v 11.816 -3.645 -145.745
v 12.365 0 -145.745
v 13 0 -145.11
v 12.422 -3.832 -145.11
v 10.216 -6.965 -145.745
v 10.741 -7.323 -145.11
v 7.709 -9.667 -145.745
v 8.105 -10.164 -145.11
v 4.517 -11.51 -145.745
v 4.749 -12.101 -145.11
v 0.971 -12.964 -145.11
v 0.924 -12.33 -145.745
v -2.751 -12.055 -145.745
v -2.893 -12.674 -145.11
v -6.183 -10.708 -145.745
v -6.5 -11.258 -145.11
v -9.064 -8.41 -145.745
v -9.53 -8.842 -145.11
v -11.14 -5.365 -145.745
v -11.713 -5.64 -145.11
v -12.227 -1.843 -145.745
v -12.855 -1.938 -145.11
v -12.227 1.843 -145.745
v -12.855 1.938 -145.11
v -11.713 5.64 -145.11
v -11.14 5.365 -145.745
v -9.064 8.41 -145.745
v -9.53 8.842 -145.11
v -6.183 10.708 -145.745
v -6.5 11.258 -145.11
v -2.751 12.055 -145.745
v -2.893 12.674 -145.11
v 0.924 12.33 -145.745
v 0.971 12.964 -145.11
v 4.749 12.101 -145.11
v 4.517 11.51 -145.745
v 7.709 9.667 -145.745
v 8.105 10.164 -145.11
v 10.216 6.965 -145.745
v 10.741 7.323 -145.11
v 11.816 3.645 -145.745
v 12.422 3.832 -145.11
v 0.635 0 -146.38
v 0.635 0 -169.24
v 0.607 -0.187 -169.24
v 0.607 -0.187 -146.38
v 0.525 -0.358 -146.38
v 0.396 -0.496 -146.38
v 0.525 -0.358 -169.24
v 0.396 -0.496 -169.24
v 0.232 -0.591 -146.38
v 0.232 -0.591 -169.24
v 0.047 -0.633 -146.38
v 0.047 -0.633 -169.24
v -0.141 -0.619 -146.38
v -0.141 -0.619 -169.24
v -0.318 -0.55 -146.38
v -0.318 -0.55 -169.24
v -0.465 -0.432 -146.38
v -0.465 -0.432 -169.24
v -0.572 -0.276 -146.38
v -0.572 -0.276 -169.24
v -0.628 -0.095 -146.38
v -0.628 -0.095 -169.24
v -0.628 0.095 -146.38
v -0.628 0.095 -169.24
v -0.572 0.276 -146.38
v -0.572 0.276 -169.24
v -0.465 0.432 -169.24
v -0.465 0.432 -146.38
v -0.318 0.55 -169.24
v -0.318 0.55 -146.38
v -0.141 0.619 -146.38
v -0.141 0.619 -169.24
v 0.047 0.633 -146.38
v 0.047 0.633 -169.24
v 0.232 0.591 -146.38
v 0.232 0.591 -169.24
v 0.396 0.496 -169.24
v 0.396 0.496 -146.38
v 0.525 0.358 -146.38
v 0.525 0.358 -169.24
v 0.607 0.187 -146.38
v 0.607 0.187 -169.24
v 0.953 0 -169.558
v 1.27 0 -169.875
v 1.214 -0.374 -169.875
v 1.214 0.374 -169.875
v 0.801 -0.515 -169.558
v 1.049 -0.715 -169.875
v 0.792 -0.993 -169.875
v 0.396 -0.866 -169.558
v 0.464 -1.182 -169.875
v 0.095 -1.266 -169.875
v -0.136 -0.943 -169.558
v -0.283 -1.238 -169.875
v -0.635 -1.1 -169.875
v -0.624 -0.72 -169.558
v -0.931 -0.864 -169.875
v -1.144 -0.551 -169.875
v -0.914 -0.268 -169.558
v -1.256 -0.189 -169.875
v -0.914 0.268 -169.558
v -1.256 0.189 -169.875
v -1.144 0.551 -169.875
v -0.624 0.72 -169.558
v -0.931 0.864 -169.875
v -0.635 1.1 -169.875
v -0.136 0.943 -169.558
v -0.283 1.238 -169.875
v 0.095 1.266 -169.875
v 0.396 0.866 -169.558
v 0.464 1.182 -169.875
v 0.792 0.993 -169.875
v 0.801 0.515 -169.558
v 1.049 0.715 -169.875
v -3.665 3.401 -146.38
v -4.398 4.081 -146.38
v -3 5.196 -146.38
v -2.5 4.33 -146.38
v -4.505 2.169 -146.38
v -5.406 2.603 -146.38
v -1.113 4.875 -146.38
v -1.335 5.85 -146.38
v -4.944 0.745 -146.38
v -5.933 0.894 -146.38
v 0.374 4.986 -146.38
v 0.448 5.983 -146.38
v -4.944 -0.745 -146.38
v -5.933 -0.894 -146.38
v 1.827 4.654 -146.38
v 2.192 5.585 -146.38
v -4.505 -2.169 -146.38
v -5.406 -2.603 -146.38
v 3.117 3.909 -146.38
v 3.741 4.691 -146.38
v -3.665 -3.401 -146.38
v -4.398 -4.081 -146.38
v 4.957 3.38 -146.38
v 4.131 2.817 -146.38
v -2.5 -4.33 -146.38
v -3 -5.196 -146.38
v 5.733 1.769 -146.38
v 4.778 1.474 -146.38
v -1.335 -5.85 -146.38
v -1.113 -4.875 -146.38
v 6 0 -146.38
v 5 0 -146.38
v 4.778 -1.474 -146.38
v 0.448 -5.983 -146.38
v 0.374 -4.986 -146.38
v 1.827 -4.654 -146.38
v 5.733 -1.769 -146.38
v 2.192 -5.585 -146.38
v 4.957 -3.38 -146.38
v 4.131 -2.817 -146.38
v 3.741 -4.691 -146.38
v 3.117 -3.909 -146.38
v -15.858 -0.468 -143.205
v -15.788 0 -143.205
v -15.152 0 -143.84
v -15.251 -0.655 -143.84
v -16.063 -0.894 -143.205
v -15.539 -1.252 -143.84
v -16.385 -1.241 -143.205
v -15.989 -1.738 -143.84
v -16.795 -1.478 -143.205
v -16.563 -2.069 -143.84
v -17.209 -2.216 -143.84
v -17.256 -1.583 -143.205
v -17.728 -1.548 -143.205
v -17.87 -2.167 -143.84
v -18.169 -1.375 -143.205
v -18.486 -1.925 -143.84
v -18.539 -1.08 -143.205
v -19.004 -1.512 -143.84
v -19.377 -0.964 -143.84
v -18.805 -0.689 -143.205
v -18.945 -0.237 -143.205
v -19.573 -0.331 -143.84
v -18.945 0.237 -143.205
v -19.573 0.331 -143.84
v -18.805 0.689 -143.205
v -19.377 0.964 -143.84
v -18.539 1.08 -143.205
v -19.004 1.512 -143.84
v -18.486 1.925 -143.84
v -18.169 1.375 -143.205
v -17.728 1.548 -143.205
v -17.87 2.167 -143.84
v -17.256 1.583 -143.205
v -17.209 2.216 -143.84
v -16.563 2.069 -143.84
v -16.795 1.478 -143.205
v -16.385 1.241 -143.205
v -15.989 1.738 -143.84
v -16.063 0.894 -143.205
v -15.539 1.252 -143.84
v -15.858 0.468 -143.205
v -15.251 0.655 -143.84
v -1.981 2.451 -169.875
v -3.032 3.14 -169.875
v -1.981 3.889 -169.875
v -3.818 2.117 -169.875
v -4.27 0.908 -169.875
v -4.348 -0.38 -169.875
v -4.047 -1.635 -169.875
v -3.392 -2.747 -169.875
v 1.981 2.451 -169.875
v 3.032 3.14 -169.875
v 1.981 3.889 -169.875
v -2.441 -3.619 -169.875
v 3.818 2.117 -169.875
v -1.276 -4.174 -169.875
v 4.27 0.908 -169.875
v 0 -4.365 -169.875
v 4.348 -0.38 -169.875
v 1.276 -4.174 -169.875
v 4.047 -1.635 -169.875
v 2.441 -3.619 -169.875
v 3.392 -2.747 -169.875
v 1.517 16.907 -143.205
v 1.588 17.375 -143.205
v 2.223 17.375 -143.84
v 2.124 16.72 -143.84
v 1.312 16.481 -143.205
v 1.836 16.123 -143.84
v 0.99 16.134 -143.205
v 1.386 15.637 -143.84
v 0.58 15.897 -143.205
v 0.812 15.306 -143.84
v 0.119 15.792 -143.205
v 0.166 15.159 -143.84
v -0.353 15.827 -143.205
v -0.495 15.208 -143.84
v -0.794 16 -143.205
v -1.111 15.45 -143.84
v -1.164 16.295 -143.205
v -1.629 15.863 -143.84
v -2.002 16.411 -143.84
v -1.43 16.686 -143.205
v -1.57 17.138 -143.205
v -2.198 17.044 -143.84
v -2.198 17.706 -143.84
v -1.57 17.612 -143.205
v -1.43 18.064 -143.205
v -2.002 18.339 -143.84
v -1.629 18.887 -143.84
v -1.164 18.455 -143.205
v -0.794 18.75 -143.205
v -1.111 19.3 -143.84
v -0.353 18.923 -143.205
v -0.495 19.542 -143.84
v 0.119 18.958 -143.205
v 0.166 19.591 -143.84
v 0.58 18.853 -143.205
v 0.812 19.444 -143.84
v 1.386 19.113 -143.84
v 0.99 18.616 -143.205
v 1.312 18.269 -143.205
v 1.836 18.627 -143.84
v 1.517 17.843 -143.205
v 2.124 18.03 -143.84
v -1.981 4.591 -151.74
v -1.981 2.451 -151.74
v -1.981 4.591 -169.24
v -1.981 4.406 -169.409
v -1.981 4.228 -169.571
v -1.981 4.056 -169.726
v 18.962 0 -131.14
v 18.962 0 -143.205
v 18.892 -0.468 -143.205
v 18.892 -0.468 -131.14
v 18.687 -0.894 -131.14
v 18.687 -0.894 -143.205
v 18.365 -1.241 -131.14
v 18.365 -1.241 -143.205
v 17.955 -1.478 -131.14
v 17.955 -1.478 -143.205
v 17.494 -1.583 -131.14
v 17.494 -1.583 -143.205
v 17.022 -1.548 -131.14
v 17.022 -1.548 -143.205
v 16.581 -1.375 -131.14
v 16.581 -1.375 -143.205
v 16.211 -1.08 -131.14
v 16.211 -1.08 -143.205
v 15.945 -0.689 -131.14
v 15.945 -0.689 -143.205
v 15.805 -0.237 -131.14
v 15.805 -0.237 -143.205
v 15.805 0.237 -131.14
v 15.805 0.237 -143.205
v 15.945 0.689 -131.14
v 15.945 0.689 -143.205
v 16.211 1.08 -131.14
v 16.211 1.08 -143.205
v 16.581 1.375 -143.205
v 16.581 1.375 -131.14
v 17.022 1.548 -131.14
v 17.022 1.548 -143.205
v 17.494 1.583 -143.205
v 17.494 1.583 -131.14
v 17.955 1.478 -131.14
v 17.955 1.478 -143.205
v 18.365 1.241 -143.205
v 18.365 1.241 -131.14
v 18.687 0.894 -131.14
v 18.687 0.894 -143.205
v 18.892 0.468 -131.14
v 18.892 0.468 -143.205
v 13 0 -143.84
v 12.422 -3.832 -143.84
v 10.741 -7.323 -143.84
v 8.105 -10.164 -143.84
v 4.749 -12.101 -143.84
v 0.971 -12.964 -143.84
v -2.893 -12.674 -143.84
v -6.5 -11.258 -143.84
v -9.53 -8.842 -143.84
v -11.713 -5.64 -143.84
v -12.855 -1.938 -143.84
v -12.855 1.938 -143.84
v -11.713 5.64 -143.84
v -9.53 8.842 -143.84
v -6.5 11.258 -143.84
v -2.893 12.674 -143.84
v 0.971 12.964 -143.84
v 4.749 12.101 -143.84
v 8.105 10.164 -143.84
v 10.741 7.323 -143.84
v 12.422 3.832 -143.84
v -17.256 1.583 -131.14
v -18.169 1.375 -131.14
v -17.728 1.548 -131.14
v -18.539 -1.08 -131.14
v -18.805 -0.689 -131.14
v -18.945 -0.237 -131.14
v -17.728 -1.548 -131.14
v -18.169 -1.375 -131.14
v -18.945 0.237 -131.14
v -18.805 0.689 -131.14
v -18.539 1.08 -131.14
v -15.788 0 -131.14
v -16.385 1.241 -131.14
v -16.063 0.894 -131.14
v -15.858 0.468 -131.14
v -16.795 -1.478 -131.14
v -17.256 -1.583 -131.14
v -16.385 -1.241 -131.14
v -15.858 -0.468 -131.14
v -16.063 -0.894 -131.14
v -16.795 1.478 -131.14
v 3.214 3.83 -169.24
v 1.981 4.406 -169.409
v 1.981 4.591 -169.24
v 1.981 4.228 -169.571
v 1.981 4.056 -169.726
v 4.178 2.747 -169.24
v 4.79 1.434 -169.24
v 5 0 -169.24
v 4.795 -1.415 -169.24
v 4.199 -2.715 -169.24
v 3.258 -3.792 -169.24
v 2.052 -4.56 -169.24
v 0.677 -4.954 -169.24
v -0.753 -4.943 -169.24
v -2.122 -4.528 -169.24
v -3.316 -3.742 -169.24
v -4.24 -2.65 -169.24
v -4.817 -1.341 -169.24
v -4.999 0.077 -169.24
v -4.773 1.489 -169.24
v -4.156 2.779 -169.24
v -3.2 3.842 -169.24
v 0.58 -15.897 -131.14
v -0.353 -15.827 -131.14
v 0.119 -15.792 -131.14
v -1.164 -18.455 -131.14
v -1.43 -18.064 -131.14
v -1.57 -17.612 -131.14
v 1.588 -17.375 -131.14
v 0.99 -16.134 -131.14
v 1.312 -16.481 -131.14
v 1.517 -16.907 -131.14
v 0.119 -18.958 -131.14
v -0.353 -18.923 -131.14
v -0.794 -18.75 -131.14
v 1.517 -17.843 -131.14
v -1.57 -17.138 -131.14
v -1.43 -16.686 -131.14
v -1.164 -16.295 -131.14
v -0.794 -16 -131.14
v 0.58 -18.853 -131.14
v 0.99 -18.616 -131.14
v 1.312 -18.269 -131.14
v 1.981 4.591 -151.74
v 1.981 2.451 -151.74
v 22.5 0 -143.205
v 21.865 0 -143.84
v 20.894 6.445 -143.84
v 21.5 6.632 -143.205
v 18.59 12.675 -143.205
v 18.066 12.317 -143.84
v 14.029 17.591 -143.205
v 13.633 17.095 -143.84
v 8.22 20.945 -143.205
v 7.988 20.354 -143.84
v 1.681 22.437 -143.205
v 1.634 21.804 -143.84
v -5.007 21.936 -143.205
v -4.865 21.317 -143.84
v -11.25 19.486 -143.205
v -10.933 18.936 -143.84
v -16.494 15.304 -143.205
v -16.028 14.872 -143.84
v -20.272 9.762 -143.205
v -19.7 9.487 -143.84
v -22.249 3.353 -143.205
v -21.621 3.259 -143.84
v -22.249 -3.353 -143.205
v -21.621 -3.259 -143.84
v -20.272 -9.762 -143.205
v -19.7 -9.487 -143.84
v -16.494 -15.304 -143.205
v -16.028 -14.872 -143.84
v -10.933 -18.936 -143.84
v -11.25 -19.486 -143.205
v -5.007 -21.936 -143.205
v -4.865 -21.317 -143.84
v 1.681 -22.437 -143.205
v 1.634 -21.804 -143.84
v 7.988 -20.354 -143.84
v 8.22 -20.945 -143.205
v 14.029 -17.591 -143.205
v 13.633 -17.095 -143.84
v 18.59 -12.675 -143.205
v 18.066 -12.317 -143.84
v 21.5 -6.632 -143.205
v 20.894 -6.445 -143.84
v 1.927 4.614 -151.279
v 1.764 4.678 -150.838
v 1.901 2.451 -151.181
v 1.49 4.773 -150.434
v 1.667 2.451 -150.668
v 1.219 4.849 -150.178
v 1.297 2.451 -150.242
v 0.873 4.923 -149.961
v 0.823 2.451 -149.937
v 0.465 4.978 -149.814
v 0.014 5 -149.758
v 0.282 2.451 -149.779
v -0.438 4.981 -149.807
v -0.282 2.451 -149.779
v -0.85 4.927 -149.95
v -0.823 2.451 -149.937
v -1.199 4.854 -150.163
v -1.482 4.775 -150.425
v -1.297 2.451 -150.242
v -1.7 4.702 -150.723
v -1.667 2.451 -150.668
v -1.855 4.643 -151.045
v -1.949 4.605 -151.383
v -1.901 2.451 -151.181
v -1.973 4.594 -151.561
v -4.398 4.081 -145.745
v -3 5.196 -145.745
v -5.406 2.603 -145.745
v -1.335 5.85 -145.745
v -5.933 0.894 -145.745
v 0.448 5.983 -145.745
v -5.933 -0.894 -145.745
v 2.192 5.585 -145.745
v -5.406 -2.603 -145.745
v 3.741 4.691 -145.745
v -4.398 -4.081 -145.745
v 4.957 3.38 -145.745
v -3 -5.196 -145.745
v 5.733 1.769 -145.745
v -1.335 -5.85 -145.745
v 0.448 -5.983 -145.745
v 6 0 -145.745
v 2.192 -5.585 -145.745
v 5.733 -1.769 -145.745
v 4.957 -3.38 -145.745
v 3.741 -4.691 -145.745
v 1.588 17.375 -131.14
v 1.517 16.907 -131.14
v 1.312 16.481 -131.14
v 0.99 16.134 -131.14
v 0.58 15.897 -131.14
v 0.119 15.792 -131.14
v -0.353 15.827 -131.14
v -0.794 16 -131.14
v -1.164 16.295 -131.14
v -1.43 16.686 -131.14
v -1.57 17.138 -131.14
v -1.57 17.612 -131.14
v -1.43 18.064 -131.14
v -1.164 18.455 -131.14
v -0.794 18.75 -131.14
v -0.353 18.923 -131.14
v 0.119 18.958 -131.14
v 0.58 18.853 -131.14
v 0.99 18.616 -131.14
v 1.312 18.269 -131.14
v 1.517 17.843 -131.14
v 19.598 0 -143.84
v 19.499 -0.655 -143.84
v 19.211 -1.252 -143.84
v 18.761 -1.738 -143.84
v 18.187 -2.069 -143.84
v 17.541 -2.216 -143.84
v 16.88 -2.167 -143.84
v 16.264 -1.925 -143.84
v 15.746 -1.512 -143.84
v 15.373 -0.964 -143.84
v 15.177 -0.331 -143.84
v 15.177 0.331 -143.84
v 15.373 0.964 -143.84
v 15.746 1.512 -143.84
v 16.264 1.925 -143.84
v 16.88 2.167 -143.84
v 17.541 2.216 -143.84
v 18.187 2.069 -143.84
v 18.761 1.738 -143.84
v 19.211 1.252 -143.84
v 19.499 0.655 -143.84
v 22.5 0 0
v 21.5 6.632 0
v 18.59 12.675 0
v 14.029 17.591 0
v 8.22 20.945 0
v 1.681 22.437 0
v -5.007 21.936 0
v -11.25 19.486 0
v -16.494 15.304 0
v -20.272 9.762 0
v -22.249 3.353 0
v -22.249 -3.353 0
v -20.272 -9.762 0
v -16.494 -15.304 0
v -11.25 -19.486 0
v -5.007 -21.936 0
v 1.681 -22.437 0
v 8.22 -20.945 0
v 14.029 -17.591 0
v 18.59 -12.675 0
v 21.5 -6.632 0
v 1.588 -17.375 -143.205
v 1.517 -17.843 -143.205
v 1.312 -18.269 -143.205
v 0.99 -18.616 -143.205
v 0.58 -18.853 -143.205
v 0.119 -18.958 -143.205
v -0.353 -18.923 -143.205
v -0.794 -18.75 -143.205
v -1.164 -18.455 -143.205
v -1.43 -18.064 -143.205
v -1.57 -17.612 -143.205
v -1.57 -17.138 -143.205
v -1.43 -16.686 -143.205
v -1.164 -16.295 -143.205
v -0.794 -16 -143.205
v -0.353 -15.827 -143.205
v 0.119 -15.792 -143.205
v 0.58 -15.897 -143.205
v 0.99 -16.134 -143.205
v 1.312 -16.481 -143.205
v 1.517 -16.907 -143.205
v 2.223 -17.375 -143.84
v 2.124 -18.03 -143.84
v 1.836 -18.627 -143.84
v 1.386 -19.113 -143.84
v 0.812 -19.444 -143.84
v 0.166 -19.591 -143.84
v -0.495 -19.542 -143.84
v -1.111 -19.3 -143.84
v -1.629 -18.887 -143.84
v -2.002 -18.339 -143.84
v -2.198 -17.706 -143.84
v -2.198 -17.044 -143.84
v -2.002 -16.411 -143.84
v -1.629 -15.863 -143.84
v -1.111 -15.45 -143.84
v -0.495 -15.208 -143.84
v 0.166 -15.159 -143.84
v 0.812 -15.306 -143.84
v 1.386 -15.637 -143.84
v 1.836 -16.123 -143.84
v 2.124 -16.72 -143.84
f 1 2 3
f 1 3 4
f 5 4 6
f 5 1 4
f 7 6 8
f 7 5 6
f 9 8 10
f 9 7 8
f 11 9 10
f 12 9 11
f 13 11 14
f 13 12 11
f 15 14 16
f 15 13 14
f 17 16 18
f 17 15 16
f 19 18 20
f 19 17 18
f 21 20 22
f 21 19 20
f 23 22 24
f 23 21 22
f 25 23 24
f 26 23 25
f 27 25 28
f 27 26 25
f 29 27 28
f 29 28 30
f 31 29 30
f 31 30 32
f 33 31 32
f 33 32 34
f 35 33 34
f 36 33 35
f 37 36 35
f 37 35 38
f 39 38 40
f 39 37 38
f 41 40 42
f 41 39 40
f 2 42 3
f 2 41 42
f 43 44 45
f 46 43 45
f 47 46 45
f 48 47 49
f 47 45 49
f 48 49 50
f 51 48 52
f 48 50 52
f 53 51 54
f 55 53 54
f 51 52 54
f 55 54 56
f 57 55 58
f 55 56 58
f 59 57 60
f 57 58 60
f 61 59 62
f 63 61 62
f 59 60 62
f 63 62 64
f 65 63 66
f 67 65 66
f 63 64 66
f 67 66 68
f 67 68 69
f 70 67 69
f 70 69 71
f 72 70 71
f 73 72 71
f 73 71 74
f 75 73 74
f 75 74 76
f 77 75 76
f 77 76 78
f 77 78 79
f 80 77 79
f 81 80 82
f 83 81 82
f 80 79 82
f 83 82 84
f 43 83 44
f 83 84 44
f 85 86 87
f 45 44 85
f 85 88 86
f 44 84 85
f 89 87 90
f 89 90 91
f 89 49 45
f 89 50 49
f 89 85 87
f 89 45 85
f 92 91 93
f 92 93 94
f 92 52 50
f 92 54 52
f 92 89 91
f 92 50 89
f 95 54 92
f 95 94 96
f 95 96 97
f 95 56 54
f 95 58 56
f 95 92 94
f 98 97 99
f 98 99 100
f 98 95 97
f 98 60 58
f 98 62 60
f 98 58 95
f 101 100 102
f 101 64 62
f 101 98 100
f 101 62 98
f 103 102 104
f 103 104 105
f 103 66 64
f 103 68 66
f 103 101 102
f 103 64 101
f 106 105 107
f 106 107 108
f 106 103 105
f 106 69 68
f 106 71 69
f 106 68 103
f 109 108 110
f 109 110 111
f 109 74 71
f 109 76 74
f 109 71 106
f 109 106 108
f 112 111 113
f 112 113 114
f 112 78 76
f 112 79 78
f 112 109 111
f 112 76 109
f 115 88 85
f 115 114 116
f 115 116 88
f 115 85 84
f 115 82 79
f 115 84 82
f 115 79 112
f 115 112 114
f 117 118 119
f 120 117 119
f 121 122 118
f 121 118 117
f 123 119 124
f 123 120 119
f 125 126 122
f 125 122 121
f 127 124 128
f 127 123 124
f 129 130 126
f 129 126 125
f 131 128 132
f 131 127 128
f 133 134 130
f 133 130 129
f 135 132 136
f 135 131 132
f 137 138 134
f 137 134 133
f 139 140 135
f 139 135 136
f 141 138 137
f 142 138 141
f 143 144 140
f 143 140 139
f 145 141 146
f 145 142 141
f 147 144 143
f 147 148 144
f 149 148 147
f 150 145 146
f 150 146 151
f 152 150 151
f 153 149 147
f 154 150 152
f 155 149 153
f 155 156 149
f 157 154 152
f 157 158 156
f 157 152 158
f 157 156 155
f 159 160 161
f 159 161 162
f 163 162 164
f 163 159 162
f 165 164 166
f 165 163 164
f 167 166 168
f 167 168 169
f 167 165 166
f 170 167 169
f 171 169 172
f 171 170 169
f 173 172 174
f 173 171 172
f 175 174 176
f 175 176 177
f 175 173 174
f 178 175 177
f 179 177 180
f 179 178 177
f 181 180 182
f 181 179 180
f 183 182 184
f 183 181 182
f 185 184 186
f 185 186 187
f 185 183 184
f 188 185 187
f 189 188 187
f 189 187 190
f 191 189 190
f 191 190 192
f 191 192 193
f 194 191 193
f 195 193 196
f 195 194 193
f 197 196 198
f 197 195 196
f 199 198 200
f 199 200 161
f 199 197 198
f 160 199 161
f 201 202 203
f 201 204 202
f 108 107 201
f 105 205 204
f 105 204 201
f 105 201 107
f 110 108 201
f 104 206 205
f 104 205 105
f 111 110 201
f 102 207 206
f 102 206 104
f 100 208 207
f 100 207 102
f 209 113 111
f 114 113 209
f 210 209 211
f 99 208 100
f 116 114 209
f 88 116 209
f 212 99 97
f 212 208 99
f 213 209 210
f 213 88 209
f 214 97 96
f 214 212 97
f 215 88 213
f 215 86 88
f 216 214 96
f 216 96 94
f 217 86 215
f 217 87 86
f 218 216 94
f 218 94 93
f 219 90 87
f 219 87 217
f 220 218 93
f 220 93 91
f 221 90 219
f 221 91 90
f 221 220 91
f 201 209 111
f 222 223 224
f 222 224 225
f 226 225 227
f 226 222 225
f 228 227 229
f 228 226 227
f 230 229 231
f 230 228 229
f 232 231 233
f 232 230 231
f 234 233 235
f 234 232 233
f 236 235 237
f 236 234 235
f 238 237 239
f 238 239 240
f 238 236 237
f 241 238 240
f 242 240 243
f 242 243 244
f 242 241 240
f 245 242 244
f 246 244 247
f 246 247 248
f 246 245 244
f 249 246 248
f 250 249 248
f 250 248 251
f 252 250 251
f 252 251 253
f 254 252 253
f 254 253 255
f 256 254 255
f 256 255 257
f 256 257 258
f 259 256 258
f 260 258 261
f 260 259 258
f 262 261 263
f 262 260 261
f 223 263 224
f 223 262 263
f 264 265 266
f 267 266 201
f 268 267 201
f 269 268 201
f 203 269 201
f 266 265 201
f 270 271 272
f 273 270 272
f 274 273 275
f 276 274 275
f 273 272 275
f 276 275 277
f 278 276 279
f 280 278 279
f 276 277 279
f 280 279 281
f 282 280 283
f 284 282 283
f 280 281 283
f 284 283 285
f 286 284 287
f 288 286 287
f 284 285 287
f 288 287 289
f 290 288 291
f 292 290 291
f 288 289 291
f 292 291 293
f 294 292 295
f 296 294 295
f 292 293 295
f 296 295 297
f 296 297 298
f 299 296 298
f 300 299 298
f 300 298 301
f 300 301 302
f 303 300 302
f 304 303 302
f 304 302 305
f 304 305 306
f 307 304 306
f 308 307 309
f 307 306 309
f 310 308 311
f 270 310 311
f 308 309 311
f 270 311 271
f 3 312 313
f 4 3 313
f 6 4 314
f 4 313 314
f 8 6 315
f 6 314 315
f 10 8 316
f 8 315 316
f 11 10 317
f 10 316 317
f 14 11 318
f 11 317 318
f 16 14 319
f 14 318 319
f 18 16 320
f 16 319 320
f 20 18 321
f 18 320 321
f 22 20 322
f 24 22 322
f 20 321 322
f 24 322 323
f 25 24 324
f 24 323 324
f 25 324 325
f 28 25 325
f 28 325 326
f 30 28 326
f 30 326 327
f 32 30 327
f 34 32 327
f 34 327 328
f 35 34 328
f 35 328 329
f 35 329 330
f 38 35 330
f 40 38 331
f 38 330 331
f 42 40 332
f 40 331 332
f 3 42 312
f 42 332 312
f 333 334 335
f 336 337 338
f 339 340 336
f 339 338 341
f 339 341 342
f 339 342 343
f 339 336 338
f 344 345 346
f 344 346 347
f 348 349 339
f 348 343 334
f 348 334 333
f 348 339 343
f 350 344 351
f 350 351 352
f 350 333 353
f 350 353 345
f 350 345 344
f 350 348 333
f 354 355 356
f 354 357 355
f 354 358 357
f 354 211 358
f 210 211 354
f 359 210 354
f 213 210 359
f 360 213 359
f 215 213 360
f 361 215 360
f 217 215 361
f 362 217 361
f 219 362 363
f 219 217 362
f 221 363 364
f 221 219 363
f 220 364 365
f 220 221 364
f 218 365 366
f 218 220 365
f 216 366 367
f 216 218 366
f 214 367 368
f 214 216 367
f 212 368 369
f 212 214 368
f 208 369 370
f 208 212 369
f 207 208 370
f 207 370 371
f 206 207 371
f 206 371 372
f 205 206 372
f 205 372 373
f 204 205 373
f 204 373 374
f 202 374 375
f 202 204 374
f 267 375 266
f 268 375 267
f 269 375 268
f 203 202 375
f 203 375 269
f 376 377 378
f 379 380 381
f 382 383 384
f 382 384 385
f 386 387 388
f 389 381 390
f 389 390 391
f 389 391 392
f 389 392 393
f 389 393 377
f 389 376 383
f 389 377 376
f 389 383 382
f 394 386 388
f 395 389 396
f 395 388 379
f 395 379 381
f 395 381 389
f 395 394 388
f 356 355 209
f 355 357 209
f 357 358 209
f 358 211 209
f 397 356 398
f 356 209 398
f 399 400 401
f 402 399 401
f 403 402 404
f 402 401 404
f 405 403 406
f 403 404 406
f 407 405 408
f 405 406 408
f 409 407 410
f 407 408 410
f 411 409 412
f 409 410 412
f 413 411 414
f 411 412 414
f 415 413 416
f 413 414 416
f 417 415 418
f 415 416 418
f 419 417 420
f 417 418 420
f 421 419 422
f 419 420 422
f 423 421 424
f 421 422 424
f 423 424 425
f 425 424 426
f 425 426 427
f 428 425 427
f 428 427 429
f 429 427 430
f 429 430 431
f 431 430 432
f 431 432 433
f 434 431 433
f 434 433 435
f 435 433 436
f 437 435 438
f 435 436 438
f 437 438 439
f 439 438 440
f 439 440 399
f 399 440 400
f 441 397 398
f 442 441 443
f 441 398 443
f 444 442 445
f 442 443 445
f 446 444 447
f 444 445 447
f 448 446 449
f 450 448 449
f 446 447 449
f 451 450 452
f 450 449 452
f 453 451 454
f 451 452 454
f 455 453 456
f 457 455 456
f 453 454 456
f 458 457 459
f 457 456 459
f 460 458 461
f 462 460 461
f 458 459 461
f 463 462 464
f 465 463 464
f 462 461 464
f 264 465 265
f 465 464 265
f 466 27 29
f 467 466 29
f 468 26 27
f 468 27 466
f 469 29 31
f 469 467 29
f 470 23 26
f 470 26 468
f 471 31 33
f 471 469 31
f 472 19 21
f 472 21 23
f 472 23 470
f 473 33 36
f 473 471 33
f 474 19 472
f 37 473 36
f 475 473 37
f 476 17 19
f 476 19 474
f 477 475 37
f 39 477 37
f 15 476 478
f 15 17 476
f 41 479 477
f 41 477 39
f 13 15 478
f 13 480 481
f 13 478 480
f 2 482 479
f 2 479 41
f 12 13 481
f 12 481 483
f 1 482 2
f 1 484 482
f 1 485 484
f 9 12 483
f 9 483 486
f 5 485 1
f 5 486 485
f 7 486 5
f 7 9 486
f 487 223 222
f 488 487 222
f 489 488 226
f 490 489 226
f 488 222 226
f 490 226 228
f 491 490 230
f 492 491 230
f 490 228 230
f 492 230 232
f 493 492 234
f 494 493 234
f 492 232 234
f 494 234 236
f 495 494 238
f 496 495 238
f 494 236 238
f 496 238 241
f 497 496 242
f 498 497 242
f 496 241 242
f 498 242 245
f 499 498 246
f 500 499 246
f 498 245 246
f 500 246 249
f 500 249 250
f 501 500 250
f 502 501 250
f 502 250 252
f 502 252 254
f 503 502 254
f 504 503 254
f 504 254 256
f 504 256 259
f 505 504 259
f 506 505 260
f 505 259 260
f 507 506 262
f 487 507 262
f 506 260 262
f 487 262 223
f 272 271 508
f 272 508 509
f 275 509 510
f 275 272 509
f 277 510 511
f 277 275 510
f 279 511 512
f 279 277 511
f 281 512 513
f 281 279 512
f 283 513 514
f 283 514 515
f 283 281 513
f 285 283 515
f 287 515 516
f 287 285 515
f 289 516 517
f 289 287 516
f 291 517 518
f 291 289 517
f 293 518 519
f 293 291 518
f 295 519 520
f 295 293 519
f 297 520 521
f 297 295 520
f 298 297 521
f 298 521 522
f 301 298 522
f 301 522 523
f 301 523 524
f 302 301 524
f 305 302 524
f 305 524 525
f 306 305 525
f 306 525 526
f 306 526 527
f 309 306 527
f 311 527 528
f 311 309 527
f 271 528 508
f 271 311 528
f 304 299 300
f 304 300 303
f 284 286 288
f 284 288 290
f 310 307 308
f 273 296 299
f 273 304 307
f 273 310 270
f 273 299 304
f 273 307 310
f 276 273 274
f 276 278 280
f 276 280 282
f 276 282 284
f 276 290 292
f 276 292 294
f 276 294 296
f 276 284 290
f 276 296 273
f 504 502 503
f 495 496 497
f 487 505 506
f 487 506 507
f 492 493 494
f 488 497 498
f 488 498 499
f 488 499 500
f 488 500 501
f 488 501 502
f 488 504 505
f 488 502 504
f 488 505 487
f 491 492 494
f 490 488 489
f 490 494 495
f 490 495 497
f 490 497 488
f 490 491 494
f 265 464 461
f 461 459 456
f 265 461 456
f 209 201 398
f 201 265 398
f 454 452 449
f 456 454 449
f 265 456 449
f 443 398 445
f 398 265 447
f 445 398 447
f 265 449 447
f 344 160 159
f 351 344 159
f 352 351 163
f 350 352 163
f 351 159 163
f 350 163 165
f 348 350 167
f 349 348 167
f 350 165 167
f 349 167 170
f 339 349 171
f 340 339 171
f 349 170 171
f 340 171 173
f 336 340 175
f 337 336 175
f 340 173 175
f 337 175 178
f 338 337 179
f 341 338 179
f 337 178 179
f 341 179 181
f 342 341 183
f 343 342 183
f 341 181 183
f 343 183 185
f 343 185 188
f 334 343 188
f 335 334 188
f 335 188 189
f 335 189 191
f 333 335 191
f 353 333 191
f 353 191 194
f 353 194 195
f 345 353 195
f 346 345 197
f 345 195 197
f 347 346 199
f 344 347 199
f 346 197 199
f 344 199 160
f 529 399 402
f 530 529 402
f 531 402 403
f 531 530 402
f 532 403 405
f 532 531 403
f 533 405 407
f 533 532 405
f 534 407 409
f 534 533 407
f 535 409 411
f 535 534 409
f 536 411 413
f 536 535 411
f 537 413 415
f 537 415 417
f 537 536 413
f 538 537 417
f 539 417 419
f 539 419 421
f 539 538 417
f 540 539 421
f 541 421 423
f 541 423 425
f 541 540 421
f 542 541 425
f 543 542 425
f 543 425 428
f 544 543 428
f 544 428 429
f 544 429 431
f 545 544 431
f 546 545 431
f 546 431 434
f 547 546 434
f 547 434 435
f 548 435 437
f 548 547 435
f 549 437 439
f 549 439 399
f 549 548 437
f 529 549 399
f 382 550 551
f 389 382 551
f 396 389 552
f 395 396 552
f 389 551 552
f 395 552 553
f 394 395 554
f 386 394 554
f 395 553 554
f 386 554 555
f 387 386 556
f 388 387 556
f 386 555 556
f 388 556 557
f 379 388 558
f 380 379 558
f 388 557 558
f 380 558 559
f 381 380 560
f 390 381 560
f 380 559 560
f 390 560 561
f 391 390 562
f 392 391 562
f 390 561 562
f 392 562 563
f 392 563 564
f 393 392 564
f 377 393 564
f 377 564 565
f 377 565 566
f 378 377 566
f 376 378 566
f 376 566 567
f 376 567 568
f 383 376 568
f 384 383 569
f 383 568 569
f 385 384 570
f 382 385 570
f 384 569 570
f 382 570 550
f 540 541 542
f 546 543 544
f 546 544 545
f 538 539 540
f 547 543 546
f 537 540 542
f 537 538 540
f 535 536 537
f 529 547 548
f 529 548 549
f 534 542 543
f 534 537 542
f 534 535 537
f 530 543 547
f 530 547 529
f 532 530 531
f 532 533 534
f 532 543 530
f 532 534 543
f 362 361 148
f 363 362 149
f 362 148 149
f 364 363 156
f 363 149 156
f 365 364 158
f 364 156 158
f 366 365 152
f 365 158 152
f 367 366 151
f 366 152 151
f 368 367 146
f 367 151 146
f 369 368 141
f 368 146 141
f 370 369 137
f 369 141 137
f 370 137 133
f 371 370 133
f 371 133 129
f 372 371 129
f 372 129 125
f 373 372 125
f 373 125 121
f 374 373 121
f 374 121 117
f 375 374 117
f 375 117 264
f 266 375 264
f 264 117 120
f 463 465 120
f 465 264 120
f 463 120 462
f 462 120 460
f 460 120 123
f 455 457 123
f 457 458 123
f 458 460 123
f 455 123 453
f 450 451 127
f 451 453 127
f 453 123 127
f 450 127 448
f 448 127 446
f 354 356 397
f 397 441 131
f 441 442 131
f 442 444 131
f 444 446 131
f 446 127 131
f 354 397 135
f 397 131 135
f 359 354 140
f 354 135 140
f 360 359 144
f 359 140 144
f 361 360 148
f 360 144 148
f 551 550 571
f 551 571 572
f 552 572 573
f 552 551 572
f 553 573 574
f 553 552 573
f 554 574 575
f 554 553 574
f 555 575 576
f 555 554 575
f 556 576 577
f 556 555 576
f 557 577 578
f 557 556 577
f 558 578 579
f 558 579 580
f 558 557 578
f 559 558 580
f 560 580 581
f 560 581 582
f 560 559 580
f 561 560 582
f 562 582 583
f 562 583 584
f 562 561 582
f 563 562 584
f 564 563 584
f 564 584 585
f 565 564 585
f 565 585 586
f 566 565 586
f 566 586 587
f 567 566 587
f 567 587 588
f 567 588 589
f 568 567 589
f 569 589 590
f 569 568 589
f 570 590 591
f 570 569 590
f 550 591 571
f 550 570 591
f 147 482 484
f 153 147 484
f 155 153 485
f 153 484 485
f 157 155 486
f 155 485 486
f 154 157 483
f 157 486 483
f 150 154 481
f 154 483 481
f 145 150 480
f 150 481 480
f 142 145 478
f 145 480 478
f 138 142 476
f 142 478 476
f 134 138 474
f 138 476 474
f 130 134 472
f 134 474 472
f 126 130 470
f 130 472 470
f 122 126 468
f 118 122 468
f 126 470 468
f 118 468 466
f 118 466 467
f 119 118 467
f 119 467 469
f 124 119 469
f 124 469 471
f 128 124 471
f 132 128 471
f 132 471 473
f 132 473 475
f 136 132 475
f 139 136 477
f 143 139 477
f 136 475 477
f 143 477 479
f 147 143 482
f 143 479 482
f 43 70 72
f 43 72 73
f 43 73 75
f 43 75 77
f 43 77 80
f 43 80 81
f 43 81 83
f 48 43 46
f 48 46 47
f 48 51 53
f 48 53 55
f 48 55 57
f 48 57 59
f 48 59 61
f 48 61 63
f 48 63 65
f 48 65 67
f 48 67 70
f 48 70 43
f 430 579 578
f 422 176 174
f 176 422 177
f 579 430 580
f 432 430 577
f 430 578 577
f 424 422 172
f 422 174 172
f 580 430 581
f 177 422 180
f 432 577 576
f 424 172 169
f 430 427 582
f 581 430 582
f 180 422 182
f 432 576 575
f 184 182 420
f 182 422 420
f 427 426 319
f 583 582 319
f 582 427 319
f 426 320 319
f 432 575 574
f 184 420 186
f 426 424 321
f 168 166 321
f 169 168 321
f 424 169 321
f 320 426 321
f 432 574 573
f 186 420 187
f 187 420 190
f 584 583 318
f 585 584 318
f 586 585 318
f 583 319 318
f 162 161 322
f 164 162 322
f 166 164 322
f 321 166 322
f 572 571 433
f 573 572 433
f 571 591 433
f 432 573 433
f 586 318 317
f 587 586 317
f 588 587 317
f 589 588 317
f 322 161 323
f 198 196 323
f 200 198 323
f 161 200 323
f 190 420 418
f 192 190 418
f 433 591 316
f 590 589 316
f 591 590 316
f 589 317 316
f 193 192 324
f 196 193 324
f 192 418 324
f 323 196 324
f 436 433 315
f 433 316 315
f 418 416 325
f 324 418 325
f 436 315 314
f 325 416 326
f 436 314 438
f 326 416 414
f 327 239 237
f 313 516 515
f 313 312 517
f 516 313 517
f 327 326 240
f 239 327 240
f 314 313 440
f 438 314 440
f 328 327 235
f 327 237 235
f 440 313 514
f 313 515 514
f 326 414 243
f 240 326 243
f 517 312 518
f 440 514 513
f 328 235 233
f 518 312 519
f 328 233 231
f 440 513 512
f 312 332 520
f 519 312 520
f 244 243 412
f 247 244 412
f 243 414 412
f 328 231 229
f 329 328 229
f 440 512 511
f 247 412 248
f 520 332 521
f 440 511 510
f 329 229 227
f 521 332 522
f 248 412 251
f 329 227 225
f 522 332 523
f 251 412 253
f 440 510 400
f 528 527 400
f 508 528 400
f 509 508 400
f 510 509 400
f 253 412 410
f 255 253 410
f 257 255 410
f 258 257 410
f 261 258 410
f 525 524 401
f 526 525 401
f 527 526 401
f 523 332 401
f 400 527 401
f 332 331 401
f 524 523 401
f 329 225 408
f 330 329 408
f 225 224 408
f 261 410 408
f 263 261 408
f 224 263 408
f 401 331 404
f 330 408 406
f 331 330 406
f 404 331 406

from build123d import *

# Parameters (mm, degrees)
F0_R      = 22.5
F1_DEPTH  = 143.8402
F2_R      = 13
F3_DEPTH  = 1.905
F4_R      = 6
F5_DEPTH  = 0.635
F6_R      = 5
F7_DEPTH  = 23.495
F10_DEPTH = 20.0499
F11_R     = 0.635
F12_DEPTH = 23.495
F13_R     = 1.5875
F14_DEPTH = 12.7
F15_SIZE  = 0.635


with BuildPart() as f1:
    # F0 (on Top) → F1 (new body)
    with BuildSketch(Plane.XY):
        Circle(F0_R)
    extrude(amount=-F1_DEPTH)

    # F2 (on face) → F3 (join)
    with BuildSketch(Plane(origin=(0, 0, -143.8402), x_dir=(1, 0, 0), z_dir=(0, 0, -1))):
        Circle(F2_R)
    extrude(amount=F3_DEPTH)

    # F4 (on face) → F5 (join)
    with BuildSketch(Plane(origin=(0, 0, -145.7452), x_dir=(1, 0, 0), z_dir=(0, 0, -1))):
        Circle(F4_R)
    extrude(amount=F5_DEPTH)

    # F6 (on face) → F7 (join)
    with BuildSketch(Plane(origin=(0, 0, -146.3802), x_dir=(1, 0, 0), z_dir=(0, 0, -1))):
        Circle(F6_R)
    extrude(amount=F7_DEPTH)

    # F9 (on offset) → F10 (cut, through all)
    with BuildSketch(Plane.XZ.offset(-2.4511)):
        with BuildLine():
            Line((-1.9812, -169.8752), (0, -169.8752))
            Line((0, -169.8752), (1.9812, -169.8752))
            Line((1.9812, -169.8752), (1.9812, -151.7396))
            ThreePointArc((1.9812, -151.7396), (0, -149.7584), (-1.9812, -151.7396))
            Line((-1.9812, -151.7396), (-1.9812, -169.8752))
        make_face()
    extrude(amount=-F10_DEPTH, mode=Mode.SUBTRACT)

    # F11 (on face) → F12 (cut)
    with BuildSketch(Plane(origin=(0, 0, -169.8752), x_dir=(1, 0, 0), z_dir=(0, 0, -1))):
        Circle(F11_R)
    extrude(amount=-F12_DEPTH, mode=Mode.SUBTRACT)

    # F13 (on face) → F14 (cut)
    with BuildSketch(Plane(origin=(0, 0, -143.8402), x_dir=(1, 0, 0), z_dir=(0, 0, -1))):
        with Locations((0, 17.375)):
            Circle(F13_R)
        with Locations((-17.375, 0)):
            Circle(F13_R)
        with Locations((0, -17.375)):
            Circle(F13_R)
        with Locations((17.375, 0)):
            Circle(F13_R)
    extrude(amount=-F14_DEPTH, mode=Mode.SUBTRACT)

    # F15
    f15_edges = [f1.edges().sort_by_distance(p)[0] for p in [
        (-0.635, 0, -169.8752),
        (-18.9625, 0, -143.8402),
        (-1.5875, 17.375, -143.8402),
        (15.7875, 0, -143.8402),
        (-1.5875, -17.375, -143.8402),
        (-2.74718, -4.177679, -169.8752),
        (-13, 0, -145.7452),
        (-22.5, 0, -143.8402),
    ]]
    chamfer(f15_edges, length=F15_SIZE)


solid = f1.part
